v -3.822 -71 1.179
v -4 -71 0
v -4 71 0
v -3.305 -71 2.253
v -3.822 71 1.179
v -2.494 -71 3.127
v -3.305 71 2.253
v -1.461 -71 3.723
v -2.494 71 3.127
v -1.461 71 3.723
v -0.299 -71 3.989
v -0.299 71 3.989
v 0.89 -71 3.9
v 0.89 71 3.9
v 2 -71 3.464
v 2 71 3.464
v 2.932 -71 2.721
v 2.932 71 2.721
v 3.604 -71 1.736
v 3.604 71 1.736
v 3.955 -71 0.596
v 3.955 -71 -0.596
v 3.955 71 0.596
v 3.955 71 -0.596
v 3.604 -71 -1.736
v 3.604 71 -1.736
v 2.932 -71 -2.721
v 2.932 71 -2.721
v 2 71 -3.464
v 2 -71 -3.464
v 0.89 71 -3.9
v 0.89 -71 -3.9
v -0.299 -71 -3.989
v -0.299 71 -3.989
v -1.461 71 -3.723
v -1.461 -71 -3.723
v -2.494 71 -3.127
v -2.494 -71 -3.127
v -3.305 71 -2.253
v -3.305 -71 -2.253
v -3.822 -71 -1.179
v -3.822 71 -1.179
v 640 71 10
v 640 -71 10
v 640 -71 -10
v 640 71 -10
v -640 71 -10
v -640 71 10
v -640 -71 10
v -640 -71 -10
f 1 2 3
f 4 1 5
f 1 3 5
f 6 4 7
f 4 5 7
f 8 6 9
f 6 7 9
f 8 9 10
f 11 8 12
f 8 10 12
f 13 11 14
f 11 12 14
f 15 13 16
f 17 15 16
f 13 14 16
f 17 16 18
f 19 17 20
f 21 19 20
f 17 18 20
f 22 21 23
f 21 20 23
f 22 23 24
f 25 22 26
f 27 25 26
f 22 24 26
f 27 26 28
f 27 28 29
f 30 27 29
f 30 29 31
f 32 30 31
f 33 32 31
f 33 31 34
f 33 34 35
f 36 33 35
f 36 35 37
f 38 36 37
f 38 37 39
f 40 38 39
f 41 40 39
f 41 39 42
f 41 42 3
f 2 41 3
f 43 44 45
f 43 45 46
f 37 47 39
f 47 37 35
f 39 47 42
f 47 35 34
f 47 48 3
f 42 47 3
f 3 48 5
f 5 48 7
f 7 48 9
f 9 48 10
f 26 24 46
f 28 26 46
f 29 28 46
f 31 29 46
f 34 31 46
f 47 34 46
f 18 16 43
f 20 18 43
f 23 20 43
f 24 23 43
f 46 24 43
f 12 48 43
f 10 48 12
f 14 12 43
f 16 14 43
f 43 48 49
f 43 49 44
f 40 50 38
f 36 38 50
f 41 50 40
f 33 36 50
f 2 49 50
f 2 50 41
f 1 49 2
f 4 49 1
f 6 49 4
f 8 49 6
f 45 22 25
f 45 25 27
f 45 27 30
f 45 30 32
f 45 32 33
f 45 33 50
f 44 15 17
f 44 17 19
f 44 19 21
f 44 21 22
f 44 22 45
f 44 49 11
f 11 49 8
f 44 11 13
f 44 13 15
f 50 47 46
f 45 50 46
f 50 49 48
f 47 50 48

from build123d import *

# Parameters (mm, degrees)
F0_W     = 1280
F0_H     = 142
F1_DEPTH = 10
F3_D     = 8


with BuildPart() as f1:
    # F0 (on Top) → F1 (new body, symmetric)
    with BuildSketch(Plane.XY):
        Rectangle(F0_W, F0_H)
    extrude(amount=F1_DEPTH, both=True)

    # F3 (through all)
    with Locations(Plane.XZ.offset(71)):
        with Locations((0, 0)):
            Hole(F3_D / 2)


solid = f1.part
